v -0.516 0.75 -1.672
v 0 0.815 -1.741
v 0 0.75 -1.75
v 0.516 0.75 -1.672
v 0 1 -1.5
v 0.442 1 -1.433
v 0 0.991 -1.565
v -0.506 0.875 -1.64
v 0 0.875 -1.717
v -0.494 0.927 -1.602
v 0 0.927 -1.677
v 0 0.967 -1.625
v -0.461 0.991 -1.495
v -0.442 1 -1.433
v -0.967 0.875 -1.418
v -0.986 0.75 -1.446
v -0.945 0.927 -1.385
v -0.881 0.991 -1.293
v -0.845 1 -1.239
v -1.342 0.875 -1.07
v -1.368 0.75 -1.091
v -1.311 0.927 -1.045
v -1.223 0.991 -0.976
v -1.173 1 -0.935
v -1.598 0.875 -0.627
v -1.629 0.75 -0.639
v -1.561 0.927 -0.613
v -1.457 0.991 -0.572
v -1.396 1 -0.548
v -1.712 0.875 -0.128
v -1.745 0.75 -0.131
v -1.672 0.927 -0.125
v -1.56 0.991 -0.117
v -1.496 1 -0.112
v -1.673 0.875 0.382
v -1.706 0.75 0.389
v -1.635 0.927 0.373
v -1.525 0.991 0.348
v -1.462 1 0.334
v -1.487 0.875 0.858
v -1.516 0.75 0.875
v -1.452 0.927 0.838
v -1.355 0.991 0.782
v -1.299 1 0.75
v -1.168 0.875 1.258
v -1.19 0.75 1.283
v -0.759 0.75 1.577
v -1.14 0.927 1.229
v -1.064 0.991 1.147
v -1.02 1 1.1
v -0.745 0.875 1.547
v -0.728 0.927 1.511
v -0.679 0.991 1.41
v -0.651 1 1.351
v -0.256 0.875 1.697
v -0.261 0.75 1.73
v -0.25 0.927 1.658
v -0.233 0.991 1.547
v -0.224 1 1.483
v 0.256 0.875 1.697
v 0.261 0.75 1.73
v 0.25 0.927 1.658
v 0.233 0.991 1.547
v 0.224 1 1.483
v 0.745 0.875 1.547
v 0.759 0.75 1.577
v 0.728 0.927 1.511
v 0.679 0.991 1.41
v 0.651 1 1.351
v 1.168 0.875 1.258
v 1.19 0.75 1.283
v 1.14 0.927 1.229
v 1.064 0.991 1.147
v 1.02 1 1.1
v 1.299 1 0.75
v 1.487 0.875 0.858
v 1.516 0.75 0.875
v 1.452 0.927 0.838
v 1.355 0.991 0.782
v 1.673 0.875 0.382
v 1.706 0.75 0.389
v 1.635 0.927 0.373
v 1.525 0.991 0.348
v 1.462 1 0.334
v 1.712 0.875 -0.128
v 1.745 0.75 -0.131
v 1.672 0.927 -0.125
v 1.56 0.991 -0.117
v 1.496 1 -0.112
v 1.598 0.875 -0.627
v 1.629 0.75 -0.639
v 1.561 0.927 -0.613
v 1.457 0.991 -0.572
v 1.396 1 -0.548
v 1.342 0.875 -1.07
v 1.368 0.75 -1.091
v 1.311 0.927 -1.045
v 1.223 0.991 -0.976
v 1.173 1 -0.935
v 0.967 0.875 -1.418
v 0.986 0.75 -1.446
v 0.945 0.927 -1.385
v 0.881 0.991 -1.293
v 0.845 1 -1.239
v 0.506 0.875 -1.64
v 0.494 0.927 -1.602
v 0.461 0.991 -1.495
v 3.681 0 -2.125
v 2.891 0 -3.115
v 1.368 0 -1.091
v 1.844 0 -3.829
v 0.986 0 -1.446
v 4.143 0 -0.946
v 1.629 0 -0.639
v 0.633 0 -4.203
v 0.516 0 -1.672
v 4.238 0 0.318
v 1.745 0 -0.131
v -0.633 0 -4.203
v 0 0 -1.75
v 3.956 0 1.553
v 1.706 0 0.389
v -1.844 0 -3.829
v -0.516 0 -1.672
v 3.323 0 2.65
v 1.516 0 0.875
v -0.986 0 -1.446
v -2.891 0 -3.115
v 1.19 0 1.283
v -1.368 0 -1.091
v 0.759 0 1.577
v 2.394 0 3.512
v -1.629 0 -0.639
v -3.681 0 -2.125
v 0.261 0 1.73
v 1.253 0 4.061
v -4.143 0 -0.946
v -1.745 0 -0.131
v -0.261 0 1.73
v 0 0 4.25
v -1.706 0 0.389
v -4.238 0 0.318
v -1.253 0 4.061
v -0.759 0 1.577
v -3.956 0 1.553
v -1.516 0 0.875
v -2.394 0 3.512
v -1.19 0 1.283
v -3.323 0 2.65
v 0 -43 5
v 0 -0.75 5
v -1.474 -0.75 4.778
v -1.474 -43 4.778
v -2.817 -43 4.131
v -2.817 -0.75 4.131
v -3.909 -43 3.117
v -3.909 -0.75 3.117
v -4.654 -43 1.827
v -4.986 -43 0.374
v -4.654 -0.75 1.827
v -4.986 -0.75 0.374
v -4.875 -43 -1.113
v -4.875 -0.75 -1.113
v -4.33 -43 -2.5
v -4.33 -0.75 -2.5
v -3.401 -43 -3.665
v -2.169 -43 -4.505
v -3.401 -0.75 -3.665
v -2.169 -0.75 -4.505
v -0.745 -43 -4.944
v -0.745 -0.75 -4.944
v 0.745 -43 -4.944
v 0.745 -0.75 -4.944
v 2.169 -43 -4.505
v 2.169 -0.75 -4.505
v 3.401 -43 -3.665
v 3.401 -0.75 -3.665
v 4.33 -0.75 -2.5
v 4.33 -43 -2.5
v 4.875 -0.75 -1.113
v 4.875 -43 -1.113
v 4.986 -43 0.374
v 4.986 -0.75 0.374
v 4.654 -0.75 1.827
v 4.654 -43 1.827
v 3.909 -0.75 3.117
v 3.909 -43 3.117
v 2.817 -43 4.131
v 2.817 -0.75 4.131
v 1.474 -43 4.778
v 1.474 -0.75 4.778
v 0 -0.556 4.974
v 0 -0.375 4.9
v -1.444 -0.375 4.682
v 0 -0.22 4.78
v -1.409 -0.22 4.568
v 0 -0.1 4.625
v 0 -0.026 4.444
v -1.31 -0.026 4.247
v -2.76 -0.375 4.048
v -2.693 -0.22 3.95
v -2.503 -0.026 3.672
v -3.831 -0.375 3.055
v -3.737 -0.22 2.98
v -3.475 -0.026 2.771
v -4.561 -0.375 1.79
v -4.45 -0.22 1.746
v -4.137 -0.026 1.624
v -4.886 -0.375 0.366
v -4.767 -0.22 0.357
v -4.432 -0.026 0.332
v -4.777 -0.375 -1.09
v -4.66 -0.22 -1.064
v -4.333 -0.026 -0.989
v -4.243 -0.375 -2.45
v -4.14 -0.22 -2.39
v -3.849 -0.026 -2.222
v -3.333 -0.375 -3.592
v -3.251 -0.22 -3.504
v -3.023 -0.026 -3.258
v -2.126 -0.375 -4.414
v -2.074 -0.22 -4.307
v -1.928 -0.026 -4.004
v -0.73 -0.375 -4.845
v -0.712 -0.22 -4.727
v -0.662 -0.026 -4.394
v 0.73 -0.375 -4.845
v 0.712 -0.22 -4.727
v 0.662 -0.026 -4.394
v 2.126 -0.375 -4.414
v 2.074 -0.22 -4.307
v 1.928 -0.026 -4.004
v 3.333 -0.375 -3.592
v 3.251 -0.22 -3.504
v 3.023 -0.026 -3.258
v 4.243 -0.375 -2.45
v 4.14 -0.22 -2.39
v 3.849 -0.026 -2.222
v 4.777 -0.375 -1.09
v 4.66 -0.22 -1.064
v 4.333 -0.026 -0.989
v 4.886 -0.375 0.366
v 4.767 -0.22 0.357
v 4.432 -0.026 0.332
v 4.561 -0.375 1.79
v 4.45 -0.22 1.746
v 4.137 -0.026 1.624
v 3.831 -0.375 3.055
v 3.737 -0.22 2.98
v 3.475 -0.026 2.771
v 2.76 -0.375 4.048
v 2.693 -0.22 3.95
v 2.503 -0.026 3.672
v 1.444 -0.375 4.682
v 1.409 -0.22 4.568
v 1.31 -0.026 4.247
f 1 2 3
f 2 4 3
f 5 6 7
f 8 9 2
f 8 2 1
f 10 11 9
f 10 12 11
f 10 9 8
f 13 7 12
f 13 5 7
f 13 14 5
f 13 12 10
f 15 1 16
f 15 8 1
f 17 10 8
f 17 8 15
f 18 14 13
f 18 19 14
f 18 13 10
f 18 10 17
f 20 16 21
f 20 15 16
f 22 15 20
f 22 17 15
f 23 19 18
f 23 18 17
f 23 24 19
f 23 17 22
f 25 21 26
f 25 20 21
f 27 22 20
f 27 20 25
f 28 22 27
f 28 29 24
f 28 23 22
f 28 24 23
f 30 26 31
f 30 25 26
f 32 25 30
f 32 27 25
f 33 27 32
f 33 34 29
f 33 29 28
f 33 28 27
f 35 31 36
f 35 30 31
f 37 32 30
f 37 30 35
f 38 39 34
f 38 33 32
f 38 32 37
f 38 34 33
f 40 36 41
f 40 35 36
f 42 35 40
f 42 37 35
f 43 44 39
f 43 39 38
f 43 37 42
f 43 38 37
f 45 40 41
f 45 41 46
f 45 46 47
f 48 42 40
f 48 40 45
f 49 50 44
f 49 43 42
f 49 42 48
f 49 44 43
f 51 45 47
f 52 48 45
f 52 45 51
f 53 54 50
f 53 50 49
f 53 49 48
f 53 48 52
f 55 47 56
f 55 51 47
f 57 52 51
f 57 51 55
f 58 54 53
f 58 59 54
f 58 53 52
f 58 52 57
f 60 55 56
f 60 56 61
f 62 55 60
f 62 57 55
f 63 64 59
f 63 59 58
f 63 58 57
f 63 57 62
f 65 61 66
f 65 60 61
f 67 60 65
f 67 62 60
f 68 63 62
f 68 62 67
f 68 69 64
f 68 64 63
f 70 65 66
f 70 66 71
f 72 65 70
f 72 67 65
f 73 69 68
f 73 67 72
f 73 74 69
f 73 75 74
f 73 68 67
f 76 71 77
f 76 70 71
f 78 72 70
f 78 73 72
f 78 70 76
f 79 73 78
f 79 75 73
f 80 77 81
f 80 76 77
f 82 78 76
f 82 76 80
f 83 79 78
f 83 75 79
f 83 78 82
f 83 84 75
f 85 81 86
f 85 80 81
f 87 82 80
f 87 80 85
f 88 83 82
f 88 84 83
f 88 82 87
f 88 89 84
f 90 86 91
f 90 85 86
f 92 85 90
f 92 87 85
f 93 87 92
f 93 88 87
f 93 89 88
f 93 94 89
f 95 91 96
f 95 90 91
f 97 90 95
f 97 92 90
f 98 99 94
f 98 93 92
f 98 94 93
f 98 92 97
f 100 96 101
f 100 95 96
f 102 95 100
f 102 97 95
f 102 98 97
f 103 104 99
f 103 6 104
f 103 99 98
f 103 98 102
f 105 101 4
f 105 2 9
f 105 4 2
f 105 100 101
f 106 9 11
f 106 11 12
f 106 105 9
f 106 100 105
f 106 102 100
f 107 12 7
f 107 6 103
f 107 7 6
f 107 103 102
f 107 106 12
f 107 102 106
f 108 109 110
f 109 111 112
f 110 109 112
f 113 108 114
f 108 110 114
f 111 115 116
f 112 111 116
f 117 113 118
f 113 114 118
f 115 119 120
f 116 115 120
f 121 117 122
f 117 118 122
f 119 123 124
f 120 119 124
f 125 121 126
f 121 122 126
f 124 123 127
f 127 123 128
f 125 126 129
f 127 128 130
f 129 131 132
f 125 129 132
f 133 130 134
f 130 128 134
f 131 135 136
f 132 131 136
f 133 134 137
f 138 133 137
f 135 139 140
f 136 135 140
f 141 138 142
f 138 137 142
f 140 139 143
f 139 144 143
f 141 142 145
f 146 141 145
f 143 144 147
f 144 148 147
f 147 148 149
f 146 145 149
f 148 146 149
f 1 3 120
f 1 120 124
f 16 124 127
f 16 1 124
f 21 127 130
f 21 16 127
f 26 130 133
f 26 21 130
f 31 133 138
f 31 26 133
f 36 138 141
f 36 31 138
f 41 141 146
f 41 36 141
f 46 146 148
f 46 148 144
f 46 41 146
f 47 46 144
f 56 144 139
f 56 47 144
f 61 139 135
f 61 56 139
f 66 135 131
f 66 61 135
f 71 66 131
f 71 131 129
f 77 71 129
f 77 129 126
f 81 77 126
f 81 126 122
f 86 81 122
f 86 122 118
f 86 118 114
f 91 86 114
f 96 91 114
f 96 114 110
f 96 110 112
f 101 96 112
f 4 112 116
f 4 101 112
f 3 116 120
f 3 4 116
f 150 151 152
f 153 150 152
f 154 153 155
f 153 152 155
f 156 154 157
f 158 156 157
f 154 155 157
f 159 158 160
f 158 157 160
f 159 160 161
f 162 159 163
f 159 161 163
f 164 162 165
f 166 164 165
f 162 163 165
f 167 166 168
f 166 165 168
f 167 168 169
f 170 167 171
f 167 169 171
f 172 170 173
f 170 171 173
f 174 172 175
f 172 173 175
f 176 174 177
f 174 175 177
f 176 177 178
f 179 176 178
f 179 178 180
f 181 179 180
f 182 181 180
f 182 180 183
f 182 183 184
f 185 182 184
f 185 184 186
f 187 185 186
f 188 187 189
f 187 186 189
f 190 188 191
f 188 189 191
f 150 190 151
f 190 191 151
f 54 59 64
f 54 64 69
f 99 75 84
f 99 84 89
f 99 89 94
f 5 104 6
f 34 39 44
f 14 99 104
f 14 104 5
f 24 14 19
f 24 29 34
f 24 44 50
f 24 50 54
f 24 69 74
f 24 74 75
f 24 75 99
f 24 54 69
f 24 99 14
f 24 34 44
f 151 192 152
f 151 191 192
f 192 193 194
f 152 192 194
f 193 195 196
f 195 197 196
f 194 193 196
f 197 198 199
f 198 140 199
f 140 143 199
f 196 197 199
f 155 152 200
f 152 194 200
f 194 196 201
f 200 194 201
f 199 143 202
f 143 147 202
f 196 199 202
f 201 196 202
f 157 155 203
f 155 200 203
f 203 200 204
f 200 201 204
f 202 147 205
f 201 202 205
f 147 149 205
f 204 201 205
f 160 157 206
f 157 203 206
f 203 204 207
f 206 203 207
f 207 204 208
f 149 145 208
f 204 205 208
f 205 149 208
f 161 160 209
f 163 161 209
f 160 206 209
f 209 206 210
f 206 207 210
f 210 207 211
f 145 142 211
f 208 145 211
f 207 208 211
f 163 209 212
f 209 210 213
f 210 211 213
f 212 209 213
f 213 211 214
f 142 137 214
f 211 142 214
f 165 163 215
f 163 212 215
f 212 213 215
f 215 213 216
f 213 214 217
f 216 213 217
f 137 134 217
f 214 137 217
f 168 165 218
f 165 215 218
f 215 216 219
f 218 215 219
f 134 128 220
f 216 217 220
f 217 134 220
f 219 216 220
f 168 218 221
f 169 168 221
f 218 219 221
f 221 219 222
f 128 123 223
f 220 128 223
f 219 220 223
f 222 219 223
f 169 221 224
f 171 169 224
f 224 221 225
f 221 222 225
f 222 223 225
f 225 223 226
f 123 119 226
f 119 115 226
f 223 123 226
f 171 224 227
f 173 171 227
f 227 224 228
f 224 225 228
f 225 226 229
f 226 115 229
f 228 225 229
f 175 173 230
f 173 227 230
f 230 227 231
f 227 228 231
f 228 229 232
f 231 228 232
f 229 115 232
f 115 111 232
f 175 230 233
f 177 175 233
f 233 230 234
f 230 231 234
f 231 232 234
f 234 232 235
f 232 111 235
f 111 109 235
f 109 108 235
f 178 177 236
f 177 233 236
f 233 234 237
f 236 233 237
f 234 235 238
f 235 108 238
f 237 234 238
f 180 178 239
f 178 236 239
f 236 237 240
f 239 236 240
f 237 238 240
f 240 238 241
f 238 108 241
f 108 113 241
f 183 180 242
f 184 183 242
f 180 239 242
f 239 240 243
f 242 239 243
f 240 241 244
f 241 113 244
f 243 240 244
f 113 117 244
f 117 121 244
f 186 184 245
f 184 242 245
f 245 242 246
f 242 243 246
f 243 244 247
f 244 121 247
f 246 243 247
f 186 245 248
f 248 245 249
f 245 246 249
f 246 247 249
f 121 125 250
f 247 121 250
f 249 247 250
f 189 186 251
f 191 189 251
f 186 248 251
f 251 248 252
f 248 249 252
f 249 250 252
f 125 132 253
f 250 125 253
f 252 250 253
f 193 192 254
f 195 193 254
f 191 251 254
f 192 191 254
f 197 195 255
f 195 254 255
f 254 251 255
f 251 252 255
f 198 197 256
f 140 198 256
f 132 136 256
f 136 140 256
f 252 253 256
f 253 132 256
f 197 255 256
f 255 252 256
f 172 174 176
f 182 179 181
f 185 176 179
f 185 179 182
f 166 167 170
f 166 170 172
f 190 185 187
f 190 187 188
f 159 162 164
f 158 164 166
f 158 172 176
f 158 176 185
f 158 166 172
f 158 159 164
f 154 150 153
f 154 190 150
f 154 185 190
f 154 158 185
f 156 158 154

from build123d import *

# Parameters (mm, degrees)
SKETCH1_W = 5
SKETCH1_H = 43
SKETCH2_W = 1.75
SKETCH2_H = 1
FILLET1_R = 0.75
FILLET2_R = 0.25


with BuildPart() as part:
    # Sketch1 → Revolve1 (revolve)
    with BuildSketch(Plane.XY, mode=Mode.PRIVATE) as revolve1_sk:
        with Locations((-2.5, -21.5)):
            Rectangle(SKETCH1_W, SKETCH1_H)
    revolve(revolve1_sk.sketch.rotate(Axis((0, 0, 0), (0, -1, 0)), 270), axis=Axis((0, 0, 0), (0, -1, 0)))

    # Sketch2 → Revolve2 (revolve)
    with BuildSketch(Plane.XY, mode=Mode.PRIVATE) as revolve2_sk:
        with Locations((-0.875, 0.5)):
            Rectangle(SKETCH2_W, SKETCH2_H)
    revolve(revolve2_sk.sketch.rotate(Axis((0, 0, 0), (0, 1, 0)), 270), axis=Axis((0, 0, 0), (0, 1, 0)))

    # Fillet1
    fillet1_edges = [part.edges().sort_by_distance(p)[0] for p in [
        (0, 0, -5),
    ]]
    fillet(fillet1_edges, radius=FILLET1_R)

    # Fillet2
    fillet2_edges = [part.edges().sort_by_distance(p)[0] for p in [
        (0, 1, 1.75),
    ]]
    fillet(fillet2_edges, radius=FILLET2_R)


solid = part.part
